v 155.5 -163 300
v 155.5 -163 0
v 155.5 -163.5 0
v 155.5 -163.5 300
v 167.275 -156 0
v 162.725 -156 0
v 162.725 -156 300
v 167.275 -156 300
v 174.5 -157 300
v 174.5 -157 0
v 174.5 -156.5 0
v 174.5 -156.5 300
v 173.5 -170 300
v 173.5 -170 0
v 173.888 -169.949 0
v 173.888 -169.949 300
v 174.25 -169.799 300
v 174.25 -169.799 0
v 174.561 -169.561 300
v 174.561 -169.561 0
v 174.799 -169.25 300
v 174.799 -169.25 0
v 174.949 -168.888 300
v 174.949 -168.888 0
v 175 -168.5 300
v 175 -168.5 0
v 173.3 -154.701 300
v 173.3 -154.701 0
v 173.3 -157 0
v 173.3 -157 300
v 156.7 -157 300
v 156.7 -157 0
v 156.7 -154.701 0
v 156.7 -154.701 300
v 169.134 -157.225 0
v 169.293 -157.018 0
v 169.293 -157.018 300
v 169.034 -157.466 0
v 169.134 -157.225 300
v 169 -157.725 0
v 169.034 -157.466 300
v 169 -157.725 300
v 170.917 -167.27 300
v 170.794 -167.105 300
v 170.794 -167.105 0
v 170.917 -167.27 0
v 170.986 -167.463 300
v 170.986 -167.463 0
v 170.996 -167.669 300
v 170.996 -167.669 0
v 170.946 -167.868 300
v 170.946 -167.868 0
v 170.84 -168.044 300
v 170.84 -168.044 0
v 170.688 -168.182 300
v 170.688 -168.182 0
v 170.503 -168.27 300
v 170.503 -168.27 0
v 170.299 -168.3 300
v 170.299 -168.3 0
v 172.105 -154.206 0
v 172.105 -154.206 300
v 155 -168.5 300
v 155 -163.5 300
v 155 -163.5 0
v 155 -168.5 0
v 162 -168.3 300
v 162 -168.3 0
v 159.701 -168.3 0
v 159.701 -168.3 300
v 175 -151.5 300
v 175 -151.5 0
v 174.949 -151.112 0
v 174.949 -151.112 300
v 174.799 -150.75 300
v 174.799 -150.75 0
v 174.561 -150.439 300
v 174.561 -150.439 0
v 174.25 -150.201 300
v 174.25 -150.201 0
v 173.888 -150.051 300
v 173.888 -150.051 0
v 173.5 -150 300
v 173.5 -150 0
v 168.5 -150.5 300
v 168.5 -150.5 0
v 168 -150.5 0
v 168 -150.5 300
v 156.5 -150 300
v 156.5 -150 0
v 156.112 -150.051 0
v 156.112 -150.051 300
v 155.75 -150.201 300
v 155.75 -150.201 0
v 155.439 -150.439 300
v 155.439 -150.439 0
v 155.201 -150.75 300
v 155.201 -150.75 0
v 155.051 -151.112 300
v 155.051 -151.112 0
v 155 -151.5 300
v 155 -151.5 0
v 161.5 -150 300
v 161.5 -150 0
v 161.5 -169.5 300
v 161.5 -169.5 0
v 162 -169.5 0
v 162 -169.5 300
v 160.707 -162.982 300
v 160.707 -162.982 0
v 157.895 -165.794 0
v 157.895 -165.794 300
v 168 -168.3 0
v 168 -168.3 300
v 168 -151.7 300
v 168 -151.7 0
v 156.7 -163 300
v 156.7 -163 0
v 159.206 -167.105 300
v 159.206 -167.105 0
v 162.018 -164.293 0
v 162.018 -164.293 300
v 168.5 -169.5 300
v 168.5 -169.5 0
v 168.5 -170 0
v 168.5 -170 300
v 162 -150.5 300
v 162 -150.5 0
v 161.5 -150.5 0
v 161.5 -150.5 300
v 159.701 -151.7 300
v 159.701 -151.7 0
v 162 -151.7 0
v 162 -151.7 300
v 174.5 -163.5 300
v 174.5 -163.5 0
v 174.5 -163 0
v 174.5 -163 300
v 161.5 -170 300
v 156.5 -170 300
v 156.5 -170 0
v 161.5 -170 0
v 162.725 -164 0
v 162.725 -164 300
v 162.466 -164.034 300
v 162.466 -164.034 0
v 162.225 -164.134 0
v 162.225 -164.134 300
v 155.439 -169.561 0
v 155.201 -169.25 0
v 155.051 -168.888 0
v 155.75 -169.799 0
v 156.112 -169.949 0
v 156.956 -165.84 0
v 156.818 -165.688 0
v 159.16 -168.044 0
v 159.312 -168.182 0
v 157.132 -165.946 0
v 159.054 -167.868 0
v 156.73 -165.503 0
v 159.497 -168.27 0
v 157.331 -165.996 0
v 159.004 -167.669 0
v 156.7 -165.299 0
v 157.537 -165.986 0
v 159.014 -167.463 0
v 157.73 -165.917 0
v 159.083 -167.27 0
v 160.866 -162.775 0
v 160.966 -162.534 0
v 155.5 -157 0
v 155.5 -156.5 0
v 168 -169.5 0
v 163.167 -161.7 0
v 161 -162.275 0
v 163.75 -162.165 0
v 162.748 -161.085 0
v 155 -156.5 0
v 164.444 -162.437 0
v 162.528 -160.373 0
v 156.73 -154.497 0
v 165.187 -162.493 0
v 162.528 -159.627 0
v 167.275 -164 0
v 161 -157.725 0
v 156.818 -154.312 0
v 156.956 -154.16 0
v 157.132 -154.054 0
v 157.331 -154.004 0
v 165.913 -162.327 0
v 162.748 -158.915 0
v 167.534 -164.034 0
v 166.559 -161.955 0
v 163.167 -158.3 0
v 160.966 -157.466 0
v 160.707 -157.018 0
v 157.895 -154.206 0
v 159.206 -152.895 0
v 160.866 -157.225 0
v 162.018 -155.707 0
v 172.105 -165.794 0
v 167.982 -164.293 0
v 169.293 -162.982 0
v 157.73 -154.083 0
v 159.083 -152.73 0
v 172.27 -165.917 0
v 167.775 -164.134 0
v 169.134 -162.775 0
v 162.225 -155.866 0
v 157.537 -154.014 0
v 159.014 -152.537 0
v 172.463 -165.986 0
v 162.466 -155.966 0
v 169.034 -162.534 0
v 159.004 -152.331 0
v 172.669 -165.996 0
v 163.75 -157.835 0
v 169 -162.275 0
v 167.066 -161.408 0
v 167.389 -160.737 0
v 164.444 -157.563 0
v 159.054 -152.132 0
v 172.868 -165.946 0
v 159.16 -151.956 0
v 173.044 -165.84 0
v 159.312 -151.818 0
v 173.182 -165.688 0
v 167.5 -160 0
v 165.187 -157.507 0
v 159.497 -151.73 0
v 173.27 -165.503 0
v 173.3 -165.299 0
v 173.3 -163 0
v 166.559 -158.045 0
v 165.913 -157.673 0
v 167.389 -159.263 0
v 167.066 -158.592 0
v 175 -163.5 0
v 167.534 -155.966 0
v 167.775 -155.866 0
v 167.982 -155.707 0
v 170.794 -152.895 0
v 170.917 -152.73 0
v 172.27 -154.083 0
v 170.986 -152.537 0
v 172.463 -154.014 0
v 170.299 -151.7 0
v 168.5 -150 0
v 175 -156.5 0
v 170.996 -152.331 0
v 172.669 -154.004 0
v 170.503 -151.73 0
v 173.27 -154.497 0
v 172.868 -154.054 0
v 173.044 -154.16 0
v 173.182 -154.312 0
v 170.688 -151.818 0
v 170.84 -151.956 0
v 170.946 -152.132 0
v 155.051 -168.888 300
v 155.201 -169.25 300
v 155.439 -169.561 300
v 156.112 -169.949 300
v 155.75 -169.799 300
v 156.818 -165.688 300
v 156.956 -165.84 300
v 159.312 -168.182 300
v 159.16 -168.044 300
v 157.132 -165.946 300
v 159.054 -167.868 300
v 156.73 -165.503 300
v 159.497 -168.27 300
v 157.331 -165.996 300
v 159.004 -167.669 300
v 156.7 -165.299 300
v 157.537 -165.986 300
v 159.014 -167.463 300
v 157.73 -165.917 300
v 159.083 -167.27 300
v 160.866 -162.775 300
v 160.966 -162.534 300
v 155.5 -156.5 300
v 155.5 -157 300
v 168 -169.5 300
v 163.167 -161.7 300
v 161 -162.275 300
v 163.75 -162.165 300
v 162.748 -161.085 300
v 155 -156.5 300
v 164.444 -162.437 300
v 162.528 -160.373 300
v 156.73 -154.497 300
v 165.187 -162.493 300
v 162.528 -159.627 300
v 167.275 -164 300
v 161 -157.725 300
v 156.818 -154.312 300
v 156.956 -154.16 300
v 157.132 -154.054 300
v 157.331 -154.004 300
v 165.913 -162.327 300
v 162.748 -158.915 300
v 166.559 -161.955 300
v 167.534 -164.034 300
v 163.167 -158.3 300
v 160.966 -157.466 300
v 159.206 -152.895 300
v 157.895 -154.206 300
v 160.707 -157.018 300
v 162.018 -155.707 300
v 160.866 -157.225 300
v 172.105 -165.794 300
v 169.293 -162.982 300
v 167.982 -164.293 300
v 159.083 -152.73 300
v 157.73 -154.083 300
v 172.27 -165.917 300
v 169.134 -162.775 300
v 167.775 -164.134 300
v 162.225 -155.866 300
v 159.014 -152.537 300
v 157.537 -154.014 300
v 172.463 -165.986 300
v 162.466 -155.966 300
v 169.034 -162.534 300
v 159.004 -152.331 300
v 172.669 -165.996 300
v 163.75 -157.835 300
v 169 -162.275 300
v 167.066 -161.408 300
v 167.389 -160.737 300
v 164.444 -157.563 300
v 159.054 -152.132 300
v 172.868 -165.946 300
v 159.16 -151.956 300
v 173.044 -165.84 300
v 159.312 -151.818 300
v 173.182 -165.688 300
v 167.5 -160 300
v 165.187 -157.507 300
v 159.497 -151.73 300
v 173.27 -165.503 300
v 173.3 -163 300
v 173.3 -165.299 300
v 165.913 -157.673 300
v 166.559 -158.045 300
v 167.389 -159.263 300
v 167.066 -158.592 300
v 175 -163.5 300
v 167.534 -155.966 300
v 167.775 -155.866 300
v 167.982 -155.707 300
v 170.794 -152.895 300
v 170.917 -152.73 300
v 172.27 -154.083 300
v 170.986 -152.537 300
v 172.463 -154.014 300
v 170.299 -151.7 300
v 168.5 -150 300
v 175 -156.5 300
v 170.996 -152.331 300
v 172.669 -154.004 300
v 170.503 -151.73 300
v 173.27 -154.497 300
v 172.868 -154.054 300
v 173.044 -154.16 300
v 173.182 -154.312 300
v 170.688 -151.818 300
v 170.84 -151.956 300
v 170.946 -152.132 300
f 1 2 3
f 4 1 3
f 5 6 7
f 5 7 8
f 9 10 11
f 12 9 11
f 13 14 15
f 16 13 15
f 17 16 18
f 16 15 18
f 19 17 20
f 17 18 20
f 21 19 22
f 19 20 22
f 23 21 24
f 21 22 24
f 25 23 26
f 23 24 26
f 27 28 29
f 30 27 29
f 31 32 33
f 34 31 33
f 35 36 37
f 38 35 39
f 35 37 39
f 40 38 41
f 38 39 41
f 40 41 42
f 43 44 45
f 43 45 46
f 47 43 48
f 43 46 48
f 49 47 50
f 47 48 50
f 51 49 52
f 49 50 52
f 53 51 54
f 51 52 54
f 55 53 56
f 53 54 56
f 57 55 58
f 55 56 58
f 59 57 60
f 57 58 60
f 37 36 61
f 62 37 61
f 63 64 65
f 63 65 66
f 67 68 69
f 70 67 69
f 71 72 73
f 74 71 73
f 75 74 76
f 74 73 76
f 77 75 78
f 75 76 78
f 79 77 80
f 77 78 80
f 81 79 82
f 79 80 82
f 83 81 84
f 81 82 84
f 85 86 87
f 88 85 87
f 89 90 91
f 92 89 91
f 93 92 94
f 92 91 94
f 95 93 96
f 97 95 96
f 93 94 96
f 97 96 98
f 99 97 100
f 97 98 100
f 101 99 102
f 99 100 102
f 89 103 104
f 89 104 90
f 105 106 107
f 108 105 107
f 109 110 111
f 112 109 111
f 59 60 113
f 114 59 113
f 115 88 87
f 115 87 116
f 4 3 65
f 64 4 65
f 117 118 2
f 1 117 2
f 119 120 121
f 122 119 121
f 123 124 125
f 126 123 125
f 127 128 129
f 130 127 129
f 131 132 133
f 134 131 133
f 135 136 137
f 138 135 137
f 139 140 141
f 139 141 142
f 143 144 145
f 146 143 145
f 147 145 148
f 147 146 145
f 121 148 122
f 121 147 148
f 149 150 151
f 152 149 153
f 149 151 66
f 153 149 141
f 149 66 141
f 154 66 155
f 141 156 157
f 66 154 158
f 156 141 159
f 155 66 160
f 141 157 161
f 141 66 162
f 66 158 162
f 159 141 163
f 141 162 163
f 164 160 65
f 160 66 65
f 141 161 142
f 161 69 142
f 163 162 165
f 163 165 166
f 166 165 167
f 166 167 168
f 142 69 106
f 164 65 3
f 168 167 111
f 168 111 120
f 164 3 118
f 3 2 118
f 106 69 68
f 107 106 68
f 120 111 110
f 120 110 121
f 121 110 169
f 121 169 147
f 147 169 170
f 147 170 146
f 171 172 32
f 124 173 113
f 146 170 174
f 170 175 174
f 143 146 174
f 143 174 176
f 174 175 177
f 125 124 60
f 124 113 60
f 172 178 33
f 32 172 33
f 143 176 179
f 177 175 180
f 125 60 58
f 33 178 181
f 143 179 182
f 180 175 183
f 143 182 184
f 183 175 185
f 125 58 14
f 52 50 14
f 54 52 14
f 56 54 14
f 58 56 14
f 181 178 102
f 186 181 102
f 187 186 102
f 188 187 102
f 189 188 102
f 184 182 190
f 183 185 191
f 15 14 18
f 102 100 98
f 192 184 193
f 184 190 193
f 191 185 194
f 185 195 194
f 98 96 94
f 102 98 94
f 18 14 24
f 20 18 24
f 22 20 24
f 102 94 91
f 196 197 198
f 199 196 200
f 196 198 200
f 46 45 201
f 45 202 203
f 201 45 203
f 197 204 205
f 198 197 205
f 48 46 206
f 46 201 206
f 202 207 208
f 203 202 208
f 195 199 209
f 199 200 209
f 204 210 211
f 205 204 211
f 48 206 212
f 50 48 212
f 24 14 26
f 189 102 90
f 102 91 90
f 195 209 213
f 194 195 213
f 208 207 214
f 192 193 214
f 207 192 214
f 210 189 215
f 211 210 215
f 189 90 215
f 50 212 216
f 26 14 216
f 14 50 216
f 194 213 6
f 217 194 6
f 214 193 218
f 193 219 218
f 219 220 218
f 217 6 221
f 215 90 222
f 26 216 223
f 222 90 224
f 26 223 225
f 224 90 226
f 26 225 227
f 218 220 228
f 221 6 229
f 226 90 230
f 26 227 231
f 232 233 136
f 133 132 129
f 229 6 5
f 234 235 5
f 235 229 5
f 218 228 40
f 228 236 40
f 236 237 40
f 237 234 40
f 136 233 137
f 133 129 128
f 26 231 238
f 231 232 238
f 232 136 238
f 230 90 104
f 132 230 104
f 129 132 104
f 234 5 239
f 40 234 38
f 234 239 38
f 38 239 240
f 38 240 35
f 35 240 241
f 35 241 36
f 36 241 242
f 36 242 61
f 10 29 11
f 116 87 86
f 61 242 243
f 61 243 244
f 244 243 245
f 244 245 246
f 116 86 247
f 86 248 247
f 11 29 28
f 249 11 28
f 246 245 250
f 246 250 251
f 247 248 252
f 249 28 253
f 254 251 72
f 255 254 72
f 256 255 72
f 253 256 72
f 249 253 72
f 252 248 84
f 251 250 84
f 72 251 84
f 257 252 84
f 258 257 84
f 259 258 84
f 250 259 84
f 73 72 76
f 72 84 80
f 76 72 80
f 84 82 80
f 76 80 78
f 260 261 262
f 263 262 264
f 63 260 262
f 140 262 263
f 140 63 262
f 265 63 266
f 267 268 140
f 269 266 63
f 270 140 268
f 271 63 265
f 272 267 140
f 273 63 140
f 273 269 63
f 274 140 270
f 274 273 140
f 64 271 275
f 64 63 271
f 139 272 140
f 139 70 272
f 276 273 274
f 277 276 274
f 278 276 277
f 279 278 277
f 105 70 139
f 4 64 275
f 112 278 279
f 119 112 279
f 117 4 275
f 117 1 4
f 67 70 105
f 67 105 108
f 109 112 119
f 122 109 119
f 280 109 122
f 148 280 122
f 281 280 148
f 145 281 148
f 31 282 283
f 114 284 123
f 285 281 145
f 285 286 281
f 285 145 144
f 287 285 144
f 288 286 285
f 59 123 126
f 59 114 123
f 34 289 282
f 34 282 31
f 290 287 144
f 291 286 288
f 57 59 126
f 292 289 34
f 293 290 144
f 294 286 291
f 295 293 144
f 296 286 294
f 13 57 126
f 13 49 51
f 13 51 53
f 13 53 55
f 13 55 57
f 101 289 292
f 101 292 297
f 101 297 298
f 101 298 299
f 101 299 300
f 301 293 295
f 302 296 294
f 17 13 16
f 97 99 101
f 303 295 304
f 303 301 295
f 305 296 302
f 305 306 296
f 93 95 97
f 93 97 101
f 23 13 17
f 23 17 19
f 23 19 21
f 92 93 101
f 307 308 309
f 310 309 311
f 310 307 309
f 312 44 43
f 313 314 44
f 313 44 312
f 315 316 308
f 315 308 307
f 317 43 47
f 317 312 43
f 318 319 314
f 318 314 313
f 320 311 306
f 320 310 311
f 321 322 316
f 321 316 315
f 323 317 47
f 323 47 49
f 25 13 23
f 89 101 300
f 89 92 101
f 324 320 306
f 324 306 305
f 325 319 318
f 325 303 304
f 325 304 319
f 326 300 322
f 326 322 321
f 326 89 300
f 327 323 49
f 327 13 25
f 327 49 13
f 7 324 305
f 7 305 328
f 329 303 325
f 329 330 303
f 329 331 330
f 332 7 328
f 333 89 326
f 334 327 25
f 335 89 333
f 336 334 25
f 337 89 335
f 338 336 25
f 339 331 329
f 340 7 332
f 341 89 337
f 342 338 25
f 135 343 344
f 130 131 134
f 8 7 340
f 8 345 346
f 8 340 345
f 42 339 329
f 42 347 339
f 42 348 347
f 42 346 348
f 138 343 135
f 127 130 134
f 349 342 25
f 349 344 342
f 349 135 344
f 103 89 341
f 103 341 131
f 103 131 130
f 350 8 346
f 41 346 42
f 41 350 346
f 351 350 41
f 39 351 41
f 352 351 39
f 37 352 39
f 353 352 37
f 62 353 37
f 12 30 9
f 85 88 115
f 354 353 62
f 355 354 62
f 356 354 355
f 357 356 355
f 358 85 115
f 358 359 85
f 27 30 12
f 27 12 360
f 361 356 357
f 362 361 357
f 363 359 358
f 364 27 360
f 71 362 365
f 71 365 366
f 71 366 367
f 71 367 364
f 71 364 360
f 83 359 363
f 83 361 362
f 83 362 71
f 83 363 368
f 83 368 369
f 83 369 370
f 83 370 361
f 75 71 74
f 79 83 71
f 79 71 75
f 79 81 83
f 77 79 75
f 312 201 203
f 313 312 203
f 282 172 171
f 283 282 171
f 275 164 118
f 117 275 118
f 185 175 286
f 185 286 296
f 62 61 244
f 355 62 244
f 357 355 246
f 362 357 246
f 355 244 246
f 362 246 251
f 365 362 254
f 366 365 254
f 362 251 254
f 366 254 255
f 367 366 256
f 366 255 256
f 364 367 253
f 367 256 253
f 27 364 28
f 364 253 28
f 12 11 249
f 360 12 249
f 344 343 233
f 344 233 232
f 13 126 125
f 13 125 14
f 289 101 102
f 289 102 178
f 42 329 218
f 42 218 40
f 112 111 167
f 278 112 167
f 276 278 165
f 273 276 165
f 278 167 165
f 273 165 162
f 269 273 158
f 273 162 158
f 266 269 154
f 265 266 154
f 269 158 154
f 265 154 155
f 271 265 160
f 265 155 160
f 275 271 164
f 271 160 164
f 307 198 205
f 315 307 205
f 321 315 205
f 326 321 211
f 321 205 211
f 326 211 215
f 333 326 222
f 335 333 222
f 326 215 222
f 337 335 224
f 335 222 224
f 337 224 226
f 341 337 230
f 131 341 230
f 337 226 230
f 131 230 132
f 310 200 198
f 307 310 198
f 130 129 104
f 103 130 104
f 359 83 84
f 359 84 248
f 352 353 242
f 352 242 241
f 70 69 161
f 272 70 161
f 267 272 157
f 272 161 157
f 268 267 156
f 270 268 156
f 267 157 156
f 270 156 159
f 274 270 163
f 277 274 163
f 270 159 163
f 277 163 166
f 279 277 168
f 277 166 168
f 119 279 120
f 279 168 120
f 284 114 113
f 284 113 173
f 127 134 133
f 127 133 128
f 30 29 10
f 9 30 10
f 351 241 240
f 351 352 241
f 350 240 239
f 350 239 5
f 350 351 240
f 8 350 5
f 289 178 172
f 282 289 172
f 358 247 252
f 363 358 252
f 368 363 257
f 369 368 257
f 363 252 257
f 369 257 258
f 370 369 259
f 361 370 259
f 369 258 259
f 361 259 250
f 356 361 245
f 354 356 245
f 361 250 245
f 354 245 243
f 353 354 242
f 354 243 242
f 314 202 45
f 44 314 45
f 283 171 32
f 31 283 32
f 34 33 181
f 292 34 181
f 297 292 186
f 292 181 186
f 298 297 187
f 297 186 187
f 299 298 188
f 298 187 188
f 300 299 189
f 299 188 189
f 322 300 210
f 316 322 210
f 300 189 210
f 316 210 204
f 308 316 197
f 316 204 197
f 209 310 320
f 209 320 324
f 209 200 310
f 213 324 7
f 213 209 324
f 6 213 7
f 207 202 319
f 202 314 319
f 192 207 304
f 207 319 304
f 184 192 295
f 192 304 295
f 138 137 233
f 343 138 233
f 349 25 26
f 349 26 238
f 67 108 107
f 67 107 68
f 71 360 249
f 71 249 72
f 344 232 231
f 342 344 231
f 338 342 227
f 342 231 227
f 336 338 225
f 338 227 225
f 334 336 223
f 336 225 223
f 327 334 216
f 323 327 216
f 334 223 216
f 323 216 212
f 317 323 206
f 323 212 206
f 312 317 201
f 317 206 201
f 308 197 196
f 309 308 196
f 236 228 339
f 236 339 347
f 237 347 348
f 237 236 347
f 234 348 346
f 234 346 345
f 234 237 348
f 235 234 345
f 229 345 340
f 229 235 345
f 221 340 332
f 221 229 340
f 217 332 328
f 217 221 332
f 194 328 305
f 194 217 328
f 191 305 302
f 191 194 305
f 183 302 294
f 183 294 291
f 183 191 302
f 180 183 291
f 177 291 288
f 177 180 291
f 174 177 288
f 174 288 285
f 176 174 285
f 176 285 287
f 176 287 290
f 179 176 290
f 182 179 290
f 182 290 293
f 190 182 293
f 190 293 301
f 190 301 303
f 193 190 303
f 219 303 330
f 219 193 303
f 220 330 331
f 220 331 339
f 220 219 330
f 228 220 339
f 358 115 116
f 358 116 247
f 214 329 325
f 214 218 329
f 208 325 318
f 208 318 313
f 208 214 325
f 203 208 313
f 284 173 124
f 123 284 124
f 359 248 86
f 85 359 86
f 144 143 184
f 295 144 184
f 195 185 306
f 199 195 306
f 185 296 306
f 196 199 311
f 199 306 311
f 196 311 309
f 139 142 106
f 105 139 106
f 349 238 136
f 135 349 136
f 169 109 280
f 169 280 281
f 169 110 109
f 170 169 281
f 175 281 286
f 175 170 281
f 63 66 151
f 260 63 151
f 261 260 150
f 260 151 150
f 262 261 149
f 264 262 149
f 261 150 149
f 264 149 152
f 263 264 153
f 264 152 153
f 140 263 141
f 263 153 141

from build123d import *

# Parameters (mm, degrees)
SKETCH_1_R      = 2.5
EXTRUDE_1_DEPTH = 300
EXTRUDE_START   = -300
SKETCH_2_W      = 8
SKETCH_2_H      = 8
SKETCH_2_R      = 2.5
EXTRUDE_2_DEPTH = 300
FILLET_1_R      = 1


with BuildPart() as part:
    # 草图1 → 凸台-拉伸1 (new body)
    with BuildSketch(Plane.XY):
        with BuildLine():
            Line((173.5, -150), (168.5, -150))
            Line((168.5, -150), (168.5, -150.5))
            Line((168.5, -150.5), (168, -150.5))
            Line((168, -150.5), (168, -151.70000008))
            Line((168, -151.70000008), (170.299390173, -151.70000008))
            ThreePointArc((170.299390173, -151.70000008), (170.94610582, -152.132121658), (170.794364905, -152.894974776))
            Line((170.794364905, -152.894974776), (167.175465502, -156.513874235))
            ThreePointArc((167.175465502, -156.513874235), (166.907085014, -156.653013019), (166.607569506, -156.61204781))
            ThreePointArc((166.607569506, -156.61204781), (165.969708818, -156.377547161), (165.299999837, -156.262019281))
            Line((165.299999837, -156.262019281), (165, -156.549999889))
            Line((165, -156.549999889), (164.700000163, -156.262019281))
            ThreePointArc((164.700000163, -156.262019281), (164.030290989, -156.377547213), (163.392430134, -156.61204798))
            ThreePointArc((163.392430134, -156.61204798), (163.092914607, -156.653013217), (162.824534093, -156.513874431))
            Line((162.824534093, -156.513874431), (159.205634442, -152.89497478))
            ThreePointArc((159.205634442, -152.89497478), (159.053893522, -152.13212166), (159.70060917, -151.70000008))
            Line((159.70060917, -151.70000008), (162, -151.70000008))
            Line((162, -151.70000008), (162, -150.5))
            Line((162, -150.5), (161.500000104, -150.5))
            Line((161.500000104, -150.5), (161.500000104, -150))
            Line((161.500000104, -150), (156.500000104, -150))
            ThreePointArc((156.500000104, -150), (155.439339932, -150.439339828), (155.000000104, -151.5))
            Line((155.000000104, -151.5), (155.000000104, -156.5))
            Line((155.000000104, -156.5), (155.500000104, -156.5))
            Line((155.500000104, -156.5), (155.500000104, -157))
            Line((155.500000104, -157), (156.699999897, -157))
            Line((156.699999897, -157), (156.699999897, -154.700608431))
            ThreePointArc((156.699999897, -154.700608431), (157.132121491, -154.053892778), (157.894974619, -154.205633725))
            Line((157.894974619, -154.205633725), (161.513874525, -157.824533943))
            ThreePointArc((161.513874525, -157.824533943), (161.653013299, -158.092914462), (161.61204805, -158.392429988))
            ThreePointArc((161.61204805, -158.392429988), (161.377547255, -159.030290833), (161.262019293, -159.700000002))
            Line((161.262019293, -159.700000002), (161.550000032, -160))
            Line((161.550000032, -160), (161.262019293, -160.299999998))
            ThreePointArc((161.262019293, -160.299999998), (161.37754719, -160.969708925), (161.612047835, -161.607569559))
            ThreePointArc((161.612047835, -161.607569559), (161.653013049, -161.907085066), (161.513874269, -162.175465556))
            Line((161.513874269, -162.175465556), (157.894974601, -165.79436528))
            ThreePointArc((157.894974601, -165.79436528), (157.13212148, -165.946106205), (156.699999897, -165.299390557))
            Line((156.699999897, -165.299390557), (156.699999897, -163))
            Line((156.699999897, -163), (155.500000104, -163))
            Line((155.500000104, -163), (155.500000104, -163.5))
            Line((155.500000104, -163.5), (155.000000104, -163.5))
            Line((155.000000104, -163.5), (155.000000104, -168.5))
            ThreePointArc((155.000000104, -168.5), (155.439339932, -169.560660172), (156.500000104, -170))
            Line((156.500000104, -170), (161.500000104, -170))
            Line((161.500000104, -170), (161.500000104, -169.5))
            Line((161.500000104, -169.5), (162, -169.5))
            Line((162, -169.5), (162, -168.29999992))
            Line((162, -168.29999992), (159.700610052, -168.29999992))
            ThreePointArc((159.700610052, -168.29999992), (159.053894408, -167.867878348), (159.205635312, -167.105025232))
            Line((159.205635312, -167.105025232), (162.824534559, -163.486125803))
            ThreePointArc((162.824534559, -163.486125803), (163.092915044, -163.346987014), (163.392430553, -163.387952218))
            ThreePointArc((163.392430553, -163.387952218), (164.030291195, -163.622452842), (164.700000125, -163.737980716))
            Line((164.700000125, -163.737980716), (165, -163.450000078))
            Line((165, -163.450000078), (165.299999781, -163.737980724))
            ThreePointArc((165.299999781, -163.737980724), (165.969708906, -163.622452815), (166.60756972, -163.387952089))
            ThreePointArc((166.60756972, -163.387952089), (166.907085249, -163.346986865), (167.175465757, -163.486125663))
            Line((167.175465757, -163.486125663), (170.794365024, -167.105025241))
            ThreePointArc((170.794365024, -167.105025241), (170.946105917, -167.867878353), (170.299390275, -168.29999992))
            Line((170.299390275, -168.29999992), (168, -168.29999992))
            Line((168, -168.29999992), (168, -169.5))
            Line((168, -169.5), (168.5, -169.5))
            Line((168.5, -169.5), (168.5, -170))
            Line((168.5, -170), (173.5, -170))
            ThreePointArc((173.5, -170), (174.560660172, -169.560660172), (175, -168.5))
            Line((175, -168.5), (175, -163.5))
            Line((175, -163.5), (174.499999896, -163.5))
            Line((174.499999896, -163.5), (174.499999896, -163))
            Line((174.499999896, -163), (173.300000103, -163))
            Line((173.300000103, -163), (173.300000103, -165.299391013))
            ThreePointArc((173.300000103, -165.299391013), (172.867878523, -165.946106661), (172.105025403, -165.794365741))
            Line((172.105025403, -165.794365741), (168.486125569, -162.175465907))
            ThreePointArc((168.486125569, -162.175465907), (168.346986783, -161.907085393), (168.38795202, -161.607569866))
            ThreePointArc((168.38795202, -161.607569866), (168.622452774, -160.969709062), (168.737980711, -160.299999942))
            Line((168.737980711, -160.299999942), (168.450000002, -160))
            Line((168.450000002, -160), (168.73798071, -159.70000004))
            ThreePointArc((168.73798071, -159.70000004), (168.622452807, -159.030291062), (168.387952137, -158.392430382))
            ThreePointArc((168.387952137, -158.392430382), (168.346986918, -158.092914876), (168.486125693, -157.824534383))
            Line((168.486125693, -157.824534383), (172.10502539, -154.205634503))
            ThreePointArc((172.10502539, -154.205634503), (172.867878514, -154.053893567), (173.300000103, -154.700609218))
            Line((173.300000103, -154.700609218), (173.300000103, -157))
            Line((173.300000103, -157), (174.499999896, -157))
            Line((174.499999896, -157), (174.499999896, -156.5))
            Line((174.499999896, -156.5), (175, -156.5))
            Line((175, -156.5), (175, -151.5))
            ThreePointArc((175, -151.5), (174.560660172, -150.439339828), (173.5, -150))
        make_face()
        with Locations((165, -160)):
            Circle(SKETCH_1_R, mode=Mode.SUBTRACT)
    extrude(amount=EXTRUDE_1_DEPTH)

    # 草图2 → 凸台-拉伸2 (add)
    with BuildSketch(Plane.XY.offset(300).offset(EXTRUDE_START)):
        with Locations((165, -160)):
            Rectangle(SKETCH_2_W, SKETCH_2_H)
        with Locations((165, -160)):
            Circle(SKETCH_2_R, mode=Mode.SUBTRACT)
    extrude(amount=EXTRUDE_2_DEPTH)

    # 圆角1
    fillet_1_edges = [part.edges().sort_by_distance(p)[0] for p in [
        (169, -157.31066005, 150),
        (167.68934005, -164, 150),
        (161, -162.689339833, 150),
        (162.310659662, -156, 150),
        (167.689339729, -156, 150),
        (161, -157.310659374, 150),
        (162.310660387, -164, 150),
        (169, -162.689340338, 150),
    ]]
    fillet(fillet_1_edges, radius=FILLET_1_R)


solid = part.part
